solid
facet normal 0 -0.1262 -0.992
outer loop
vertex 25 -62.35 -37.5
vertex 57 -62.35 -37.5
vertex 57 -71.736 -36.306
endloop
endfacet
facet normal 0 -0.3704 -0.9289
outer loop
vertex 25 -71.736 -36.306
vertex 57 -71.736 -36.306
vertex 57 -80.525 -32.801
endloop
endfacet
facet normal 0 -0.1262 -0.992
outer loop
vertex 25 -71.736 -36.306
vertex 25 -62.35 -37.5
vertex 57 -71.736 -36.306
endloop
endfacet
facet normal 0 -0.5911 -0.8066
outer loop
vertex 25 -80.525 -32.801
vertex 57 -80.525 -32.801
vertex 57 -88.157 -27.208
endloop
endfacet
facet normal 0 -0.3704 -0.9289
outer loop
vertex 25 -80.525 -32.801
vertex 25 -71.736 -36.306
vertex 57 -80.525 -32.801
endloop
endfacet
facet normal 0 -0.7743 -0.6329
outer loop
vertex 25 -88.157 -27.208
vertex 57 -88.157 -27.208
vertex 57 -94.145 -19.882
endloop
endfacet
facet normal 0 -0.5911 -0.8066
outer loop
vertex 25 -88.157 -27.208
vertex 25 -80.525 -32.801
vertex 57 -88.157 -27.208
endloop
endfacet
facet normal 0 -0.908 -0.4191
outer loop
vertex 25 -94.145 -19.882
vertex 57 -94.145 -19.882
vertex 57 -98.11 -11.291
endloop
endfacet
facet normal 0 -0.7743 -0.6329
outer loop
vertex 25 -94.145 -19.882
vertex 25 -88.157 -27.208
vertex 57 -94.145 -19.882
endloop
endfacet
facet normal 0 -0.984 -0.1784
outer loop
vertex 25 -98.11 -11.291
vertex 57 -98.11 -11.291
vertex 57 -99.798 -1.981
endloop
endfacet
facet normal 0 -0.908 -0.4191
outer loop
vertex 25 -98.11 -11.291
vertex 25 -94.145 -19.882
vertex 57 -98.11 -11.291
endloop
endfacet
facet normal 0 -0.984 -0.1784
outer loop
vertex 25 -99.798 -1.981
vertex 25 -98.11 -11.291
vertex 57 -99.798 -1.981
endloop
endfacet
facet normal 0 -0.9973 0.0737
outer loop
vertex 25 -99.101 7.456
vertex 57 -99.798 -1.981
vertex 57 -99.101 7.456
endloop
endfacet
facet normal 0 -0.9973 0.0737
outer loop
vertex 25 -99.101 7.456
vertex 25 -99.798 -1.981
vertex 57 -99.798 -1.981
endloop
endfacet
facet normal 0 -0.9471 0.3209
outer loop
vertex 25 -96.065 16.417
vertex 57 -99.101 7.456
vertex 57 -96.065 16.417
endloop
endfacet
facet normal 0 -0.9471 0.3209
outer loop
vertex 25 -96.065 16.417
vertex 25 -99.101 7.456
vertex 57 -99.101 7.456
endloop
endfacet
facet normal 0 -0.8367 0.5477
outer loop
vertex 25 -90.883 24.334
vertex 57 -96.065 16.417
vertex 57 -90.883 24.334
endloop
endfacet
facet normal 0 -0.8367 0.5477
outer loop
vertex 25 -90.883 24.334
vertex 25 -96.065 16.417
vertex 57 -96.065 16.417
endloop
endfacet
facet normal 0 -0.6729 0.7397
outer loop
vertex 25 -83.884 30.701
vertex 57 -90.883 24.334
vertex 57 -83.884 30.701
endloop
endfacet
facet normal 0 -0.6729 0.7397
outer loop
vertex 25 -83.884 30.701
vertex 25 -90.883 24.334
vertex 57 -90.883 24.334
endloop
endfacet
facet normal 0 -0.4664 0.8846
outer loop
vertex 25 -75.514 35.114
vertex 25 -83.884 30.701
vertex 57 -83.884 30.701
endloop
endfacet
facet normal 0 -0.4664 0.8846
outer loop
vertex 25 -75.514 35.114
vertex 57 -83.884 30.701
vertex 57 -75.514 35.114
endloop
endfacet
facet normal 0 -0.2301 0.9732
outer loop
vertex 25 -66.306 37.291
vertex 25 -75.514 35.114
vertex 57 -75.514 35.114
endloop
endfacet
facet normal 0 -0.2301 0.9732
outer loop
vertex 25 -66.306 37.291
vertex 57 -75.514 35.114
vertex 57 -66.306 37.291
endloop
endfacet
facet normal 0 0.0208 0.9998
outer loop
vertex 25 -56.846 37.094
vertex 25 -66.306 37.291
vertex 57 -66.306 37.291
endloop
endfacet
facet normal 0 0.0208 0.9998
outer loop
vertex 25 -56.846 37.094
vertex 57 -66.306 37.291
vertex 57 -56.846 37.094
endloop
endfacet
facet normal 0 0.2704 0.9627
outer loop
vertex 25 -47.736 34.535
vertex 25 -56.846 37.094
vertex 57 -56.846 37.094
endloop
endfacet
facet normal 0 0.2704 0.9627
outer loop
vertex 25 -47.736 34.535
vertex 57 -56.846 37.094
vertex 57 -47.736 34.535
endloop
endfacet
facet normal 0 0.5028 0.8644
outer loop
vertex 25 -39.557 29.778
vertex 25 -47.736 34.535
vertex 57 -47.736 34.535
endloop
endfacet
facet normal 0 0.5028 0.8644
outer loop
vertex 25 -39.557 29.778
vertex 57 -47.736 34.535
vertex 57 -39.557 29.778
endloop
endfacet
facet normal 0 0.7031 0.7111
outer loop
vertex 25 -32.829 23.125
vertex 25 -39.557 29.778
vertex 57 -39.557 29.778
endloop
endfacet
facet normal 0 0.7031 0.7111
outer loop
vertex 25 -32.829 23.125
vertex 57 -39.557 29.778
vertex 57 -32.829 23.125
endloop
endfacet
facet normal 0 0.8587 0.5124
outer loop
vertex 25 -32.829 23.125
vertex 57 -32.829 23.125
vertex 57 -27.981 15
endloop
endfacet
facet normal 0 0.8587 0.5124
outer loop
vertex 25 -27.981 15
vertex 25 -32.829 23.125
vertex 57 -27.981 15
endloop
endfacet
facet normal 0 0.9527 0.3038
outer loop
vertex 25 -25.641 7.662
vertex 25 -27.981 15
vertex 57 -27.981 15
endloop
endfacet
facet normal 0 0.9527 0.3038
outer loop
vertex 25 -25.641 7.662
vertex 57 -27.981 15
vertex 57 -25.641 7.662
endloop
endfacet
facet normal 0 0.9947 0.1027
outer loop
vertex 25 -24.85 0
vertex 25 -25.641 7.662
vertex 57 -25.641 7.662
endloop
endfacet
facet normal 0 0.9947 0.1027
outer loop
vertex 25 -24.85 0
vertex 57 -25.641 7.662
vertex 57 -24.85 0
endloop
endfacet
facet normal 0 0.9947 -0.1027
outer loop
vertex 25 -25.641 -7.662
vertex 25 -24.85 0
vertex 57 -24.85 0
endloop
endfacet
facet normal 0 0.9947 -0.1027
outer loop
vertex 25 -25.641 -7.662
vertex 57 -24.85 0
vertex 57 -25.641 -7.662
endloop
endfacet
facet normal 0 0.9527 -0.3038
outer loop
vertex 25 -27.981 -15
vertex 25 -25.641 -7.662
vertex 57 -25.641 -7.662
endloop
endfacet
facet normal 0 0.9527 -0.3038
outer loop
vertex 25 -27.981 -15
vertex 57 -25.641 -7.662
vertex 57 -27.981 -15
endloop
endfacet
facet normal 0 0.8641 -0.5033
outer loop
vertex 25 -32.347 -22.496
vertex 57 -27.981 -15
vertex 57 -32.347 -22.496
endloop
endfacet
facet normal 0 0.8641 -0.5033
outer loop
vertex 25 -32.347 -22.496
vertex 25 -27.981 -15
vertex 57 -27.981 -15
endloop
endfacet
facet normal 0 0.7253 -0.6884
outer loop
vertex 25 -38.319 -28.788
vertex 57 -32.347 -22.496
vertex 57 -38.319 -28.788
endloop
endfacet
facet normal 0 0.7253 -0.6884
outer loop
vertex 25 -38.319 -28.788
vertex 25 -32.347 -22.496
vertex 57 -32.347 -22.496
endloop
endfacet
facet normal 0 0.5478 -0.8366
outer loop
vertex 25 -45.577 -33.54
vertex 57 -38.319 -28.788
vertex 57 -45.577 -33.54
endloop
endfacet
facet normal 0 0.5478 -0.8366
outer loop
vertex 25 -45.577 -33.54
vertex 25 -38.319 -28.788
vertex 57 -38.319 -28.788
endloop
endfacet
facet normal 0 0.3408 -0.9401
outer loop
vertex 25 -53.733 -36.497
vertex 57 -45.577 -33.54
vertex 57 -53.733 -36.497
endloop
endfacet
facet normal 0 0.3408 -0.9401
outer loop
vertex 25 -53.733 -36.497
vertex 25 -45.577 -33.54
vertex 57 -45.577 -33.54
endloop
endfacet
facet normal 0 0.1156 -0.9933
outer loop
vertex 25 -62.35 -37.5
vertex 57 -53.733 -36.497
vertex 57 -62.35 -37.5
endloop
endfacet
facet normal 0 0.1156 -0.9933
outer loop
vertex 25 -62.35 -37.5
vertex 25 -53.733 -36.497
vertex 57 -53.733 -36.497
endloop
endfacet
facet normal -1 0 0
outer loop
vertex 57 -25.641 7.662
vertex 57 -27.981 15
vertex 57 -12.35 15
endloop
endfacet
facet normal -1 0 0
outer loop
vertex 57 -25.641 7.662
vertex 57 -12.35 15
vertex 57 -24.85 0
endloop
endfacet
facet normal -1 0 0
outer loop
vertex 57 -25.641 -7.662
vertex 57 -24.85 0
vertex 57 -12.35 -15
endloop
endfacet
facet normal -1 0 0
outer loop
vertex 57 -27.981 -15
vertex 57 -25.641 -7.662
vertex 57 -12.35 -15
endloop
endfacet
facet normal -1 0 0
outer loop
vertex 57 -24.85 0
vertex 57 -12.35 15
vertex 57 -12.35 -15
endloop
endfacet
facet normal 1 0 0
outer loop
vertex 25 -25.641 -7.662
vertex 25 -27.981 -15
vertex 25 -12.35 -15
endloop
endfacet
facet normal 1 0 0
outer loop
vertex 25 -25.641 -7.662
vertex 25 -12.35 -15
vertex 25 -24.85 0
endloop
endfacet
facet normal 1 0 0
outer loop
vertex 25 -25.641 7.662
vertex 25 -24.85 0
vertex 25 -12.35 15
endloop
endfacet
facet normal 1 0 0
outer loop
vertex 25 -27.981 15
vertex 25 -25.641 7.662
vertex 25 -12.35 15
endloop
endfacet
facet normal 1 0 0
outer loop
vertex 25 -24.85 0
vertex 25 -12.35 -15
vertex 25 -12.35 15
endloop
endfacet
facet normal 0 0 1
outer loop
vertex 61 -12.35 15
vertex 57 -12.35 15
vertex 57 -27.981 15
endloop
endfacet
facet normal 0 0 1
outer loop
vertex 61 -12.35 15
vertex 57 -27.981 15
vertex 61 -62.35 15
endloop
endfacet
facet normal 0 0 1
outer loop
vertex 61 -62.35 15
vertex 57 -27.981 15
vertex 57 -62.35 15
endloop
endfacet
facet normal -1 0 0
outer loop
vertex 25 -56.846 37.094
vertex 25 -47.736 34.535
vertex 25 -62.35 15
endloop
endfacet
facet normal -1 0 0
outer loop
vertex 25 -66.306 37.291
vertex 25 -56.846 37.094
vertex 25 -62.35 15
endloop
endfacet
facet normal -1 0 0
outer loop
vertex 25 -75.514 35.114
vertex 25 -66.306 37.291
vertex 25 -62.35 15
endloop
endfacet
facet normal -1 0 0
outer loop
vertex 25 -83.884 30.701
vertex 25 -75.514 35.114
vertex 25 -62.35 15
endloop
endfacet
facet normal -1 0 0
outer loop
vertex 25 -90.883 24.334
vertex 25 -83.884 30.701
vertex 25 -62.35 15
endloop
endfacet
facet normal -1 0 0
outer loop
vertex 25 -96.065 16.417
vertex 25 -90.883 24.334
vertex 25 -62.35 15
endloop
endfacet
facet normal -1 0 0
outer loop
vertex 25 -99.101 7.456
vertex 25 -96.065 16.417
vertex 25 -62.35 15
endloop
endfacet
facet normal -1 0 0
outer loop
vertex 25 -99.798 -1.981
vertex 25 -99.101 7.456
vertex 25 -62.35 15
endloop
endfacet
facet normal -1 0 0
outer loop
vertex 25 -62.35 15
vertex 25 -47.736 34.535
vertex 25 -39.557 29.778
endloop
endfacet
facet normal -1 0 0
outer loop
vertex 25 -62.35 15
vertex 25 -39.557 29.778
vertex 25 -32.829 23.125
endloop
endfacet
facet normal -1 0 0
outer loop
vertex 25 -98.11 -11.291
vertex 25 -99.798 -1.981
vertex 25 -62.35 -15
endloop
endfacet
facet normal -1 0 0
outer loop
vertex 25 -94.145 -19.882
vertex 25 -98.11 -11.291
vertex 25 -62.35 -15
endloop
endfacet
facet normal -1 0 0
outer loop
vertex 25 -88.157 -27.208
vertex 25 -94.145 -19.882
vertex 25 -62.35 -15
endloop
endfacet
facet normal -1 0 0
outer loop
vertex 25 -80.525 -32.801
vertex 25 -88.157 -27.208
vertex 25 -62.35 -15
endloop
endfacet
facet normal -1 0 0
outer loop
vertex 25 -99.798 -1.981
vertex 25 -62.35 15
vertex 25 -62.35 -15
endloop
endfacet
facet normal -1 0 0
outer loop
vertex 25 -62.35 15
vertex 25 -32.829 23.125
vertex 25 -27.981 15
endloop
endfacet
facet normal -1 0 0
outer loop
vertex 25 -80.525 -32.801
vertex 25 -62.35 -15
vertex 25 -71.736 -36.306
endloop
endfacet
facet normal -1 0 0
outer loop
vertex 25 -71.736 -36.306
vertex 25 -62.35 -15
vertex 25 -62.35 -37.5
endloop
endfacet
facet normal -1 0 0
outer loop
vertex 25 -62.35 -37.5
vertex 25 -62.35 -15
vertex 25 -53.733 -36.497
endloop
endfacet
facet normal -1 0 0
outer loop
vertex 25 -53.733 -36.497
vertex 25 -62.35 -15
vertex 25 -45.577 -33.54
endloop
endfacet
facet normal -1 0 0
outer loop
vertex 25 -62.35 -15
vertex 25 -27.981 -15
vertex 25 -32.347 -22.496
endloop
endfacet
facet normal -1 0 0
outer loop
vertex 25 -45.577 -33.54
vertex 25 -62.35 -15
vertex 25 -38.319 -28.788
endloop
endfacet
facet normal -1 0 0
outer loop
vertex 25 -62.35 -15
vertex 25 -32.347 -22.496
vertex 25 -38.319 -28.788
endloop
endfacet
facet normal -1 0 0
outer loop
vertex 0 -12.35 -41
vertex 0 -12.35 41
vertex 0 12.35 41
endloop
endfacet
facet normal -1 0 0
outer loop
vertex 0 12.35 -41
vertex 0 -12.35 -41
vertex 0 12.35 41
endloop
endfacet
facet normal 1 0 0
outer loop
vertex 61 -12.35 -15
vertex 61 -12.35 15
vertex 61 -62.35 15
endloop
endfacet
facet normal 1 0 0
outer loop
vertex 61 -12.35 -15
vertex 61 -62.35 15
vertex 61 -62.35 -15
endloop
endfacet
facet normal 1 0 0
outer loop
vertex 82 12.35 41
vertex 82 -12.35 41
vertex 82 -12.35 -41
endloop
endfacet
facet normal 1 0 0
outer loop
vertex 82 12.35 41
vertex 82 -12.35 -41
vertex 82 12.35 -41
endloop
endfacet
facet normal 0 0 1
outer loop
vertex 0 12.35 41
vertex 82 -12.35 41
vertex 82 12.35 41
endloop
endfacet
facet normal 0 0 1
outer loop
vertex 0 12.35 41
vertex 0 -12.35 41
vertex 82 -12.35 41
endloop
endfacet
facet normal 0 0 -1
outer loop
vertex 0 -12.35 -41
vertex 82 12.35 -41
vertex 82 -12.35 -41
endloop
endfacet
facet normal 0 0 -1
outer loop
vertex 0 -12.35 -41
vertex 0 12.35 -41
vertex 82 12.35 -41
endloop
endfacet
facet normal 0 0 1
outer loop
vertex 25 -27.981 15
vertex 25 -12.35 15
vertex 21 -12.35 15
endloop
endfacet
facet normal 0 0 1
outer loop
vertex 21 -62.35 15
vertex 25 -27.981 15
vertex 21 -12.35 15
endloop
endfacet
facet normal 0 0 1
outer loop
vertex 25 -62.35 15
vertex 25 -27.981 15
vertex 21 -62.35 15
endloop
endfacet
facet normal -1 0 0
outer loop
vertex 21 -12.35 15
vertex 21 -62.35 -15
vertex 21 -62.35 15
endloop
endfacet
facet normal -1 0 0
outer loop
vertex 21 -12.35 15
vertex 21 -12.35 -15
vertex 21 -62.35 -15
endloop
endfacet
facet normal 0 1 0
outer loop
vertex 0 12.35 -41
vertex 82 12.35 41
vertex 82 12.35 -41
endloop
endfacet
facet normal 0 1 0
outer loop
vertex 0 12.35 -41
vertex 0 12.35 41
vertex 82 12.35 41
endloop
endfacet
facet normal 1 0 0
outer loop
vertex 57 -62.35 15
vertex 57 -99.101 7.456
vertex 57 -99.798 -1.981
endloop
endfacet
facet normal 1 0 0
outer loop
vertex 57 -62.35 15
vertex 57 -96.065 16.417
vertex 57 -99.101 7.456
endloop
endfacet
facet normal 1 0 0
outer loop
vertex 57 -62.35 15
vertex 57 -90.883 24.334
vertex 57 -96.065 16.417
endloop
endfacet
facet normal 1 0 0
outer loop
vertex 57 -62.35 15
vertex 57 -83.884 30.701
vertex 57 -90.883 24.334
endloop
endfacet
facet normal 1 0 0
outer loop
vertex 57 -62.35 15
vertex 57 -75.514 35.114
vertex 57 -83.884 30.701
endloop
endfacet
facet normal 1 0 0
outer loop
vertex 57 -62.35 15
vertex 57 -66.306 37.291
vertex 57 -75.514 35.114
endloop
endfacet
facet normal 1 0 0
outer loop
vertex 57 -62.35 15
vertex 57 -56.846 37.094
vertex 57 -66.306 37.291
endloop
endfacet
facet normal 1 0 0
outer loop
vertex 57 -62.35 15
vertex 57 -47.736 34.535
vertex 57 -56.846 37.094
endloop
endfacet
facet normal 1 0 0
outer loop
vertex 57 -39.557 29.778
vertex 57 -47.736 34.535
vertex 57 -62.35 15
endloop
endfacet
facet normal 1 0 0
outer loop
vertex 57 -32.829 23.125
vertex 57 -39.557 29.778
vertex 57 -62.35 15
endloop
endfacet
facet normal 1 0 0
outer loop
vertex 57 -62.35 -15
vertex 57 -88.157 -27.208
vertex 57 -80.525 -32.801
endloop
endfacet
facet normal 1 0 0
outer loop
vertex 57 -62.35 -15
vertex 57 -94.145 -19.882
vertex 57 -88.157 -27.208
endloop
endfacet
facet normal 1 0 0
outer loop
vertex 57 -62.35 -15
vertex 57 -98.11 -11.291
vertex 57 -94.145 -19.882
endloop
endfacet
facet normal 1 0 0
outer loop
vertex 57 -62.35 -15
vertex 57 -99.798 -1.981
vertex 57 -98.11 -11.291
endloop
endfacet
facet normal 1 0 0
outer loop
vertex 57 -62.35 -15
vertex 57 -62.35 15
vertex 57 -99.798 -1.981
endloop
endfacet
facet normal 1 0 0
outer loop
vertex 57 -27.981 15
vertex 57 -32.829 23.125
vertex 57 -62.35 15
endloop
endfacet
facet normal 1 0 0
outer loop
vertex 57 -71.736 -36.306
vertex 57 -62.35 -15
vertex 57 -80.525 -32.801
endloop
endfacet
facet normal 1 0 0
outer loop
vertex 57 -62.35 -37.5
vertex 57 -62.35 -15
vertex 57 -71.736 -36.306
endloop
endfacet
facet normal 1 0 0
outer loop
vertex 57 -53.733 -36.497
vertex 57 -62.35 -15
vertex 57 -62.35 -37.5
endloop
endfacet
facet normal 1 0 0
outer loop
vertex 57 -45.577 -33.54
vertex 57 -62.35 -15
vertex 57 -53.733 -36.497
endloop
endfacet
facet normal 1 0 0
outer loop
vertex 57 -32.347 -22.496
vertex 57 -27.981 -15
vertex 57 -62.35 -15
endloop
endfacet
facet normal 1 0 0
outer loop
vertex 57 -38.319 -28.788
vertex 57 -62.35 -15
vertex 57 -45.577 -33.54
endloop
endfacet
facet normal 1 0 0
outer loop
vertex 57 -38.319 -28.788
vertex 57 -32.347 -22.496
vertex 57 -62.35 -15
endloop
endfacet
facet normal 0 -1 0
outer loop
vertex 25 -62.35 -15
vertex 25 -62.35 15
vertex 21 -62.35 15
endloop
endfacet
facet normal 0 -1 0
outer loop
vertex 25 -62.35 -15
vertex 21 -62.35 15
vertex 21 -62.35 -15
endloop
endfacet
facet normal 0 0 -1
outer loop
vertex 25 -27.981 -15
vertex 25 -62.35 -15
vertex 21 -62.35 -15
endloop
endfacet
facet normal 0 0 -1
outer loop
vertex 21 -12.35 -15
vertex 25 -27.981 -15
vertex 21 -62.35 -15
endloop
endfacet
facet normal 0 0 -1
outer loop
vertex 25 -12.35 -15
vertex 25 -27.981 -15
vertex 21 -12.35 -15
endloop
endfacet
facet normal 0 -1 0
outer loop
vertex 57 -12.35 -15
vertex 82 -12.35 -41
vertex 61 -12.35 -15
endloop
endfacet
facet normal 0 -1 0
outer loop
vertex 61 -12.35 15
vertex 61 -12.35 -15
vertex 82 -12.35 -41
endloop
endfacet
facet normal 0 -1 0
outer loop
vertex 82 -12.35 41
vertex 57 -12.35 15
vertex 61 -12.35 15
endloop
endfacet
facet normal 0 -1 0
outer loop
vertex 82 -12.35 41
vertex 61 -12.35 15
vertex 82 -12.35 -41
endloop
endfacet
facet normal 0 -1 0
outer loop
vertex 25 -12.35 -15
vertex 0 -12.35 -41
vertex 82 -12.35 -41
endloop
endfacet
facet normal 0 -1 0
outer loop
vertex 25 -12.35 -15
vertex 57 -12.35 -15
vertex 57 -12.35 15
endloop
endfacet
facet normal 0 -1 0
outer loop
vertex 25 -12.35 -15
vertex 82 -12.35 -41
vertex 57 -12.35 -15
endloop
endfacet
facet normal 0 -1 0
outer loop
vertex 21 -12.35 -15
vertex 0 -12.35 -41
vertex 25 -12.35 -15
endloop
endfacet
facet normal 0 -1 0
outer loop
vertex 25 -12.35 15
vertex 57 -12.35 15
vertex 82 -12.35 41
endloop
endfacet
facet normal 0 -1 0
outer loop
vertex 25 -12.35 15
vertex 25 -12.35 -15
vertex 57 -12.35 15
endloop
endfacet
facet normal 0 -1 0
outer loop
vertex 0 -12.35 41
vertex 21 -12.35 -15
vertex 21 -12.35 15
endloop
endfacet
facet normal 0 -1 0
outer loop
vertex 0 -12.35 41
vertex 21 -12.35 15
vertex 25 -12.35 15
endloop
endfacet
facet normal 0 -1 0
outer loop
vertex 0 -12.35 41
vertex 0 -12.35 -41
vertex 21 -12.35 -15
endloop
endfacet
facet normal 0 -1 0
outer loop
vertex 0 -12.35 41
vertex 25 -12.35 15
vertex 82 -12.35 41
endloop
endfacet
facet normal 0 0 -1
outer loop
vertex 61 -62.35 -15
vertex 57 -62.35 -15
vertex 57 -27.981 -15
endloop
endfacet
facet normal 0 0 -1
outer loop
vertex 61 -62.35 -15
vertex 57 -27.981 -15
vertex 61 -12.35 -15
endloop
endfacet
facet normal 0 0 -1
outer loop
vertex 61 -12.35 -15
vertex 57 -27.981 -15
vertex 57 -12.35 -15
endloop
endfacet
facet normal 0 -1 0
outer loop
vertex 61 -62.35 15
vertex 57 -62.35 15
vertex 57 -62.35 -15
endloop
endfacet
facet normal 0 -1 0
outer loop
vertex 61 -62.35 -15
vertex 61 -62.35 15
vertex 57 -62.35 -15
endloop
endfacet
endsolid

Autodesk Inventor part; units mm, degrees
ref_plane "YZ Plane" through (0, 0, 0) normal (1, 0, 0) x (0, 1, 0)
ref_plane "XZ Plane" through (0, 0, 0) normal (0, 1, 0) x (-1, 0, 0)
ref_plane "XY Plane" through (0, 0, 0) normal (0, 0, 1) x (1, 0, 0)
sketch "스케치1" plane through (0, 0, 0) normal (1, 0, 0) x (0, 1, 0)
  line L0 (-12.35, 41) -> (12.35, 41)
  line L1 (12.35, 41) -> (12.35, -41)
  line L2 (12.35, -41) -> (-12.35, -41)
  line L3 (-12.35, -41) -> (-12.35, 41)
  line L4 (-12.35, 41) -> (12.35, -41) construction
  line L5 (12.35, 41) -> (-12.35, -41) construction
  point P0 (0, 0)
  dimension "d0" = 24.7
  dimension "d1" = 82
extrude "돌출1" add sketch "스케치1" along normal blind 82
ref_plane "작업 평면1" through (41, 0, 0) normal (1, 0, 0) x (0, 0, -1)
sketch "스케치2" plane through (41, 0, 0) normal (1, 0, 0) x (0, 0, -1)
  line L0 (-41, 12.35) -> (-41, -12.35) projected
  line L1 (-41, -12.35) -> (41, -12.35) projected
  line L2 (41, -12.35) -> (41, 12.35) projected
  line L3 (41, 12.35) -> (-41, 12.35) projected
  line L4 (0, -12.35) -> (0, -62.35)
  circle A0 centre (0, -62.35) radius 37.5
  point P0 (0, 0)
  dimension "d5" = 50
  dimension "d6" = 75
extrude "돌출2" add sketch "스케치2" along normal mid plane 32 contours A0
sketch "스케치3" plane through (57, -62.35, 0) normal (1, 0, 0) x (0, 0, -1)
  line L0 (-41, 50) -> (41, 50) projected
  line L1 (0, 50) -> (-15, 50)
  line L2 (-15, 50) -> (-15, 0)
  line L3 (-15, 0) -> (15, 0)
  line L4 (15, 0) -> (15, 50)
  point P0 (0, 62.35)
  dimension "d9" = 15
  dimension "d10" = 50
  dimension "d11" = 30
extrude "돌출3" add sketch "스케치3" along normal blind 4
sketch "스케치4" plane through (25, -62.35, 0) normal (-1, 0, 0) x (0, 0, 1)
  line L0 (0, 0) -> (-15, 0)
  line L1 (-15, 0) -> (-15, 50)
  line L2 (41, 50) -> (-41, 50) projected
  line L3 (15, 50) -> (15, 34.3693) projected
  line L4 (15, 50) -> (15, 0)
  line L5 (15, 0) -> (15, 34.3693) projected
  line L6 (-15, 0) -> (15, 0)
  line L7 (15, 50) -> (-15, 50)
  point P0 (0, 62.35)
extrude "돌출4" add sketch "스케치4" along normal blind 4
properties part number "Caster" material "고무"
